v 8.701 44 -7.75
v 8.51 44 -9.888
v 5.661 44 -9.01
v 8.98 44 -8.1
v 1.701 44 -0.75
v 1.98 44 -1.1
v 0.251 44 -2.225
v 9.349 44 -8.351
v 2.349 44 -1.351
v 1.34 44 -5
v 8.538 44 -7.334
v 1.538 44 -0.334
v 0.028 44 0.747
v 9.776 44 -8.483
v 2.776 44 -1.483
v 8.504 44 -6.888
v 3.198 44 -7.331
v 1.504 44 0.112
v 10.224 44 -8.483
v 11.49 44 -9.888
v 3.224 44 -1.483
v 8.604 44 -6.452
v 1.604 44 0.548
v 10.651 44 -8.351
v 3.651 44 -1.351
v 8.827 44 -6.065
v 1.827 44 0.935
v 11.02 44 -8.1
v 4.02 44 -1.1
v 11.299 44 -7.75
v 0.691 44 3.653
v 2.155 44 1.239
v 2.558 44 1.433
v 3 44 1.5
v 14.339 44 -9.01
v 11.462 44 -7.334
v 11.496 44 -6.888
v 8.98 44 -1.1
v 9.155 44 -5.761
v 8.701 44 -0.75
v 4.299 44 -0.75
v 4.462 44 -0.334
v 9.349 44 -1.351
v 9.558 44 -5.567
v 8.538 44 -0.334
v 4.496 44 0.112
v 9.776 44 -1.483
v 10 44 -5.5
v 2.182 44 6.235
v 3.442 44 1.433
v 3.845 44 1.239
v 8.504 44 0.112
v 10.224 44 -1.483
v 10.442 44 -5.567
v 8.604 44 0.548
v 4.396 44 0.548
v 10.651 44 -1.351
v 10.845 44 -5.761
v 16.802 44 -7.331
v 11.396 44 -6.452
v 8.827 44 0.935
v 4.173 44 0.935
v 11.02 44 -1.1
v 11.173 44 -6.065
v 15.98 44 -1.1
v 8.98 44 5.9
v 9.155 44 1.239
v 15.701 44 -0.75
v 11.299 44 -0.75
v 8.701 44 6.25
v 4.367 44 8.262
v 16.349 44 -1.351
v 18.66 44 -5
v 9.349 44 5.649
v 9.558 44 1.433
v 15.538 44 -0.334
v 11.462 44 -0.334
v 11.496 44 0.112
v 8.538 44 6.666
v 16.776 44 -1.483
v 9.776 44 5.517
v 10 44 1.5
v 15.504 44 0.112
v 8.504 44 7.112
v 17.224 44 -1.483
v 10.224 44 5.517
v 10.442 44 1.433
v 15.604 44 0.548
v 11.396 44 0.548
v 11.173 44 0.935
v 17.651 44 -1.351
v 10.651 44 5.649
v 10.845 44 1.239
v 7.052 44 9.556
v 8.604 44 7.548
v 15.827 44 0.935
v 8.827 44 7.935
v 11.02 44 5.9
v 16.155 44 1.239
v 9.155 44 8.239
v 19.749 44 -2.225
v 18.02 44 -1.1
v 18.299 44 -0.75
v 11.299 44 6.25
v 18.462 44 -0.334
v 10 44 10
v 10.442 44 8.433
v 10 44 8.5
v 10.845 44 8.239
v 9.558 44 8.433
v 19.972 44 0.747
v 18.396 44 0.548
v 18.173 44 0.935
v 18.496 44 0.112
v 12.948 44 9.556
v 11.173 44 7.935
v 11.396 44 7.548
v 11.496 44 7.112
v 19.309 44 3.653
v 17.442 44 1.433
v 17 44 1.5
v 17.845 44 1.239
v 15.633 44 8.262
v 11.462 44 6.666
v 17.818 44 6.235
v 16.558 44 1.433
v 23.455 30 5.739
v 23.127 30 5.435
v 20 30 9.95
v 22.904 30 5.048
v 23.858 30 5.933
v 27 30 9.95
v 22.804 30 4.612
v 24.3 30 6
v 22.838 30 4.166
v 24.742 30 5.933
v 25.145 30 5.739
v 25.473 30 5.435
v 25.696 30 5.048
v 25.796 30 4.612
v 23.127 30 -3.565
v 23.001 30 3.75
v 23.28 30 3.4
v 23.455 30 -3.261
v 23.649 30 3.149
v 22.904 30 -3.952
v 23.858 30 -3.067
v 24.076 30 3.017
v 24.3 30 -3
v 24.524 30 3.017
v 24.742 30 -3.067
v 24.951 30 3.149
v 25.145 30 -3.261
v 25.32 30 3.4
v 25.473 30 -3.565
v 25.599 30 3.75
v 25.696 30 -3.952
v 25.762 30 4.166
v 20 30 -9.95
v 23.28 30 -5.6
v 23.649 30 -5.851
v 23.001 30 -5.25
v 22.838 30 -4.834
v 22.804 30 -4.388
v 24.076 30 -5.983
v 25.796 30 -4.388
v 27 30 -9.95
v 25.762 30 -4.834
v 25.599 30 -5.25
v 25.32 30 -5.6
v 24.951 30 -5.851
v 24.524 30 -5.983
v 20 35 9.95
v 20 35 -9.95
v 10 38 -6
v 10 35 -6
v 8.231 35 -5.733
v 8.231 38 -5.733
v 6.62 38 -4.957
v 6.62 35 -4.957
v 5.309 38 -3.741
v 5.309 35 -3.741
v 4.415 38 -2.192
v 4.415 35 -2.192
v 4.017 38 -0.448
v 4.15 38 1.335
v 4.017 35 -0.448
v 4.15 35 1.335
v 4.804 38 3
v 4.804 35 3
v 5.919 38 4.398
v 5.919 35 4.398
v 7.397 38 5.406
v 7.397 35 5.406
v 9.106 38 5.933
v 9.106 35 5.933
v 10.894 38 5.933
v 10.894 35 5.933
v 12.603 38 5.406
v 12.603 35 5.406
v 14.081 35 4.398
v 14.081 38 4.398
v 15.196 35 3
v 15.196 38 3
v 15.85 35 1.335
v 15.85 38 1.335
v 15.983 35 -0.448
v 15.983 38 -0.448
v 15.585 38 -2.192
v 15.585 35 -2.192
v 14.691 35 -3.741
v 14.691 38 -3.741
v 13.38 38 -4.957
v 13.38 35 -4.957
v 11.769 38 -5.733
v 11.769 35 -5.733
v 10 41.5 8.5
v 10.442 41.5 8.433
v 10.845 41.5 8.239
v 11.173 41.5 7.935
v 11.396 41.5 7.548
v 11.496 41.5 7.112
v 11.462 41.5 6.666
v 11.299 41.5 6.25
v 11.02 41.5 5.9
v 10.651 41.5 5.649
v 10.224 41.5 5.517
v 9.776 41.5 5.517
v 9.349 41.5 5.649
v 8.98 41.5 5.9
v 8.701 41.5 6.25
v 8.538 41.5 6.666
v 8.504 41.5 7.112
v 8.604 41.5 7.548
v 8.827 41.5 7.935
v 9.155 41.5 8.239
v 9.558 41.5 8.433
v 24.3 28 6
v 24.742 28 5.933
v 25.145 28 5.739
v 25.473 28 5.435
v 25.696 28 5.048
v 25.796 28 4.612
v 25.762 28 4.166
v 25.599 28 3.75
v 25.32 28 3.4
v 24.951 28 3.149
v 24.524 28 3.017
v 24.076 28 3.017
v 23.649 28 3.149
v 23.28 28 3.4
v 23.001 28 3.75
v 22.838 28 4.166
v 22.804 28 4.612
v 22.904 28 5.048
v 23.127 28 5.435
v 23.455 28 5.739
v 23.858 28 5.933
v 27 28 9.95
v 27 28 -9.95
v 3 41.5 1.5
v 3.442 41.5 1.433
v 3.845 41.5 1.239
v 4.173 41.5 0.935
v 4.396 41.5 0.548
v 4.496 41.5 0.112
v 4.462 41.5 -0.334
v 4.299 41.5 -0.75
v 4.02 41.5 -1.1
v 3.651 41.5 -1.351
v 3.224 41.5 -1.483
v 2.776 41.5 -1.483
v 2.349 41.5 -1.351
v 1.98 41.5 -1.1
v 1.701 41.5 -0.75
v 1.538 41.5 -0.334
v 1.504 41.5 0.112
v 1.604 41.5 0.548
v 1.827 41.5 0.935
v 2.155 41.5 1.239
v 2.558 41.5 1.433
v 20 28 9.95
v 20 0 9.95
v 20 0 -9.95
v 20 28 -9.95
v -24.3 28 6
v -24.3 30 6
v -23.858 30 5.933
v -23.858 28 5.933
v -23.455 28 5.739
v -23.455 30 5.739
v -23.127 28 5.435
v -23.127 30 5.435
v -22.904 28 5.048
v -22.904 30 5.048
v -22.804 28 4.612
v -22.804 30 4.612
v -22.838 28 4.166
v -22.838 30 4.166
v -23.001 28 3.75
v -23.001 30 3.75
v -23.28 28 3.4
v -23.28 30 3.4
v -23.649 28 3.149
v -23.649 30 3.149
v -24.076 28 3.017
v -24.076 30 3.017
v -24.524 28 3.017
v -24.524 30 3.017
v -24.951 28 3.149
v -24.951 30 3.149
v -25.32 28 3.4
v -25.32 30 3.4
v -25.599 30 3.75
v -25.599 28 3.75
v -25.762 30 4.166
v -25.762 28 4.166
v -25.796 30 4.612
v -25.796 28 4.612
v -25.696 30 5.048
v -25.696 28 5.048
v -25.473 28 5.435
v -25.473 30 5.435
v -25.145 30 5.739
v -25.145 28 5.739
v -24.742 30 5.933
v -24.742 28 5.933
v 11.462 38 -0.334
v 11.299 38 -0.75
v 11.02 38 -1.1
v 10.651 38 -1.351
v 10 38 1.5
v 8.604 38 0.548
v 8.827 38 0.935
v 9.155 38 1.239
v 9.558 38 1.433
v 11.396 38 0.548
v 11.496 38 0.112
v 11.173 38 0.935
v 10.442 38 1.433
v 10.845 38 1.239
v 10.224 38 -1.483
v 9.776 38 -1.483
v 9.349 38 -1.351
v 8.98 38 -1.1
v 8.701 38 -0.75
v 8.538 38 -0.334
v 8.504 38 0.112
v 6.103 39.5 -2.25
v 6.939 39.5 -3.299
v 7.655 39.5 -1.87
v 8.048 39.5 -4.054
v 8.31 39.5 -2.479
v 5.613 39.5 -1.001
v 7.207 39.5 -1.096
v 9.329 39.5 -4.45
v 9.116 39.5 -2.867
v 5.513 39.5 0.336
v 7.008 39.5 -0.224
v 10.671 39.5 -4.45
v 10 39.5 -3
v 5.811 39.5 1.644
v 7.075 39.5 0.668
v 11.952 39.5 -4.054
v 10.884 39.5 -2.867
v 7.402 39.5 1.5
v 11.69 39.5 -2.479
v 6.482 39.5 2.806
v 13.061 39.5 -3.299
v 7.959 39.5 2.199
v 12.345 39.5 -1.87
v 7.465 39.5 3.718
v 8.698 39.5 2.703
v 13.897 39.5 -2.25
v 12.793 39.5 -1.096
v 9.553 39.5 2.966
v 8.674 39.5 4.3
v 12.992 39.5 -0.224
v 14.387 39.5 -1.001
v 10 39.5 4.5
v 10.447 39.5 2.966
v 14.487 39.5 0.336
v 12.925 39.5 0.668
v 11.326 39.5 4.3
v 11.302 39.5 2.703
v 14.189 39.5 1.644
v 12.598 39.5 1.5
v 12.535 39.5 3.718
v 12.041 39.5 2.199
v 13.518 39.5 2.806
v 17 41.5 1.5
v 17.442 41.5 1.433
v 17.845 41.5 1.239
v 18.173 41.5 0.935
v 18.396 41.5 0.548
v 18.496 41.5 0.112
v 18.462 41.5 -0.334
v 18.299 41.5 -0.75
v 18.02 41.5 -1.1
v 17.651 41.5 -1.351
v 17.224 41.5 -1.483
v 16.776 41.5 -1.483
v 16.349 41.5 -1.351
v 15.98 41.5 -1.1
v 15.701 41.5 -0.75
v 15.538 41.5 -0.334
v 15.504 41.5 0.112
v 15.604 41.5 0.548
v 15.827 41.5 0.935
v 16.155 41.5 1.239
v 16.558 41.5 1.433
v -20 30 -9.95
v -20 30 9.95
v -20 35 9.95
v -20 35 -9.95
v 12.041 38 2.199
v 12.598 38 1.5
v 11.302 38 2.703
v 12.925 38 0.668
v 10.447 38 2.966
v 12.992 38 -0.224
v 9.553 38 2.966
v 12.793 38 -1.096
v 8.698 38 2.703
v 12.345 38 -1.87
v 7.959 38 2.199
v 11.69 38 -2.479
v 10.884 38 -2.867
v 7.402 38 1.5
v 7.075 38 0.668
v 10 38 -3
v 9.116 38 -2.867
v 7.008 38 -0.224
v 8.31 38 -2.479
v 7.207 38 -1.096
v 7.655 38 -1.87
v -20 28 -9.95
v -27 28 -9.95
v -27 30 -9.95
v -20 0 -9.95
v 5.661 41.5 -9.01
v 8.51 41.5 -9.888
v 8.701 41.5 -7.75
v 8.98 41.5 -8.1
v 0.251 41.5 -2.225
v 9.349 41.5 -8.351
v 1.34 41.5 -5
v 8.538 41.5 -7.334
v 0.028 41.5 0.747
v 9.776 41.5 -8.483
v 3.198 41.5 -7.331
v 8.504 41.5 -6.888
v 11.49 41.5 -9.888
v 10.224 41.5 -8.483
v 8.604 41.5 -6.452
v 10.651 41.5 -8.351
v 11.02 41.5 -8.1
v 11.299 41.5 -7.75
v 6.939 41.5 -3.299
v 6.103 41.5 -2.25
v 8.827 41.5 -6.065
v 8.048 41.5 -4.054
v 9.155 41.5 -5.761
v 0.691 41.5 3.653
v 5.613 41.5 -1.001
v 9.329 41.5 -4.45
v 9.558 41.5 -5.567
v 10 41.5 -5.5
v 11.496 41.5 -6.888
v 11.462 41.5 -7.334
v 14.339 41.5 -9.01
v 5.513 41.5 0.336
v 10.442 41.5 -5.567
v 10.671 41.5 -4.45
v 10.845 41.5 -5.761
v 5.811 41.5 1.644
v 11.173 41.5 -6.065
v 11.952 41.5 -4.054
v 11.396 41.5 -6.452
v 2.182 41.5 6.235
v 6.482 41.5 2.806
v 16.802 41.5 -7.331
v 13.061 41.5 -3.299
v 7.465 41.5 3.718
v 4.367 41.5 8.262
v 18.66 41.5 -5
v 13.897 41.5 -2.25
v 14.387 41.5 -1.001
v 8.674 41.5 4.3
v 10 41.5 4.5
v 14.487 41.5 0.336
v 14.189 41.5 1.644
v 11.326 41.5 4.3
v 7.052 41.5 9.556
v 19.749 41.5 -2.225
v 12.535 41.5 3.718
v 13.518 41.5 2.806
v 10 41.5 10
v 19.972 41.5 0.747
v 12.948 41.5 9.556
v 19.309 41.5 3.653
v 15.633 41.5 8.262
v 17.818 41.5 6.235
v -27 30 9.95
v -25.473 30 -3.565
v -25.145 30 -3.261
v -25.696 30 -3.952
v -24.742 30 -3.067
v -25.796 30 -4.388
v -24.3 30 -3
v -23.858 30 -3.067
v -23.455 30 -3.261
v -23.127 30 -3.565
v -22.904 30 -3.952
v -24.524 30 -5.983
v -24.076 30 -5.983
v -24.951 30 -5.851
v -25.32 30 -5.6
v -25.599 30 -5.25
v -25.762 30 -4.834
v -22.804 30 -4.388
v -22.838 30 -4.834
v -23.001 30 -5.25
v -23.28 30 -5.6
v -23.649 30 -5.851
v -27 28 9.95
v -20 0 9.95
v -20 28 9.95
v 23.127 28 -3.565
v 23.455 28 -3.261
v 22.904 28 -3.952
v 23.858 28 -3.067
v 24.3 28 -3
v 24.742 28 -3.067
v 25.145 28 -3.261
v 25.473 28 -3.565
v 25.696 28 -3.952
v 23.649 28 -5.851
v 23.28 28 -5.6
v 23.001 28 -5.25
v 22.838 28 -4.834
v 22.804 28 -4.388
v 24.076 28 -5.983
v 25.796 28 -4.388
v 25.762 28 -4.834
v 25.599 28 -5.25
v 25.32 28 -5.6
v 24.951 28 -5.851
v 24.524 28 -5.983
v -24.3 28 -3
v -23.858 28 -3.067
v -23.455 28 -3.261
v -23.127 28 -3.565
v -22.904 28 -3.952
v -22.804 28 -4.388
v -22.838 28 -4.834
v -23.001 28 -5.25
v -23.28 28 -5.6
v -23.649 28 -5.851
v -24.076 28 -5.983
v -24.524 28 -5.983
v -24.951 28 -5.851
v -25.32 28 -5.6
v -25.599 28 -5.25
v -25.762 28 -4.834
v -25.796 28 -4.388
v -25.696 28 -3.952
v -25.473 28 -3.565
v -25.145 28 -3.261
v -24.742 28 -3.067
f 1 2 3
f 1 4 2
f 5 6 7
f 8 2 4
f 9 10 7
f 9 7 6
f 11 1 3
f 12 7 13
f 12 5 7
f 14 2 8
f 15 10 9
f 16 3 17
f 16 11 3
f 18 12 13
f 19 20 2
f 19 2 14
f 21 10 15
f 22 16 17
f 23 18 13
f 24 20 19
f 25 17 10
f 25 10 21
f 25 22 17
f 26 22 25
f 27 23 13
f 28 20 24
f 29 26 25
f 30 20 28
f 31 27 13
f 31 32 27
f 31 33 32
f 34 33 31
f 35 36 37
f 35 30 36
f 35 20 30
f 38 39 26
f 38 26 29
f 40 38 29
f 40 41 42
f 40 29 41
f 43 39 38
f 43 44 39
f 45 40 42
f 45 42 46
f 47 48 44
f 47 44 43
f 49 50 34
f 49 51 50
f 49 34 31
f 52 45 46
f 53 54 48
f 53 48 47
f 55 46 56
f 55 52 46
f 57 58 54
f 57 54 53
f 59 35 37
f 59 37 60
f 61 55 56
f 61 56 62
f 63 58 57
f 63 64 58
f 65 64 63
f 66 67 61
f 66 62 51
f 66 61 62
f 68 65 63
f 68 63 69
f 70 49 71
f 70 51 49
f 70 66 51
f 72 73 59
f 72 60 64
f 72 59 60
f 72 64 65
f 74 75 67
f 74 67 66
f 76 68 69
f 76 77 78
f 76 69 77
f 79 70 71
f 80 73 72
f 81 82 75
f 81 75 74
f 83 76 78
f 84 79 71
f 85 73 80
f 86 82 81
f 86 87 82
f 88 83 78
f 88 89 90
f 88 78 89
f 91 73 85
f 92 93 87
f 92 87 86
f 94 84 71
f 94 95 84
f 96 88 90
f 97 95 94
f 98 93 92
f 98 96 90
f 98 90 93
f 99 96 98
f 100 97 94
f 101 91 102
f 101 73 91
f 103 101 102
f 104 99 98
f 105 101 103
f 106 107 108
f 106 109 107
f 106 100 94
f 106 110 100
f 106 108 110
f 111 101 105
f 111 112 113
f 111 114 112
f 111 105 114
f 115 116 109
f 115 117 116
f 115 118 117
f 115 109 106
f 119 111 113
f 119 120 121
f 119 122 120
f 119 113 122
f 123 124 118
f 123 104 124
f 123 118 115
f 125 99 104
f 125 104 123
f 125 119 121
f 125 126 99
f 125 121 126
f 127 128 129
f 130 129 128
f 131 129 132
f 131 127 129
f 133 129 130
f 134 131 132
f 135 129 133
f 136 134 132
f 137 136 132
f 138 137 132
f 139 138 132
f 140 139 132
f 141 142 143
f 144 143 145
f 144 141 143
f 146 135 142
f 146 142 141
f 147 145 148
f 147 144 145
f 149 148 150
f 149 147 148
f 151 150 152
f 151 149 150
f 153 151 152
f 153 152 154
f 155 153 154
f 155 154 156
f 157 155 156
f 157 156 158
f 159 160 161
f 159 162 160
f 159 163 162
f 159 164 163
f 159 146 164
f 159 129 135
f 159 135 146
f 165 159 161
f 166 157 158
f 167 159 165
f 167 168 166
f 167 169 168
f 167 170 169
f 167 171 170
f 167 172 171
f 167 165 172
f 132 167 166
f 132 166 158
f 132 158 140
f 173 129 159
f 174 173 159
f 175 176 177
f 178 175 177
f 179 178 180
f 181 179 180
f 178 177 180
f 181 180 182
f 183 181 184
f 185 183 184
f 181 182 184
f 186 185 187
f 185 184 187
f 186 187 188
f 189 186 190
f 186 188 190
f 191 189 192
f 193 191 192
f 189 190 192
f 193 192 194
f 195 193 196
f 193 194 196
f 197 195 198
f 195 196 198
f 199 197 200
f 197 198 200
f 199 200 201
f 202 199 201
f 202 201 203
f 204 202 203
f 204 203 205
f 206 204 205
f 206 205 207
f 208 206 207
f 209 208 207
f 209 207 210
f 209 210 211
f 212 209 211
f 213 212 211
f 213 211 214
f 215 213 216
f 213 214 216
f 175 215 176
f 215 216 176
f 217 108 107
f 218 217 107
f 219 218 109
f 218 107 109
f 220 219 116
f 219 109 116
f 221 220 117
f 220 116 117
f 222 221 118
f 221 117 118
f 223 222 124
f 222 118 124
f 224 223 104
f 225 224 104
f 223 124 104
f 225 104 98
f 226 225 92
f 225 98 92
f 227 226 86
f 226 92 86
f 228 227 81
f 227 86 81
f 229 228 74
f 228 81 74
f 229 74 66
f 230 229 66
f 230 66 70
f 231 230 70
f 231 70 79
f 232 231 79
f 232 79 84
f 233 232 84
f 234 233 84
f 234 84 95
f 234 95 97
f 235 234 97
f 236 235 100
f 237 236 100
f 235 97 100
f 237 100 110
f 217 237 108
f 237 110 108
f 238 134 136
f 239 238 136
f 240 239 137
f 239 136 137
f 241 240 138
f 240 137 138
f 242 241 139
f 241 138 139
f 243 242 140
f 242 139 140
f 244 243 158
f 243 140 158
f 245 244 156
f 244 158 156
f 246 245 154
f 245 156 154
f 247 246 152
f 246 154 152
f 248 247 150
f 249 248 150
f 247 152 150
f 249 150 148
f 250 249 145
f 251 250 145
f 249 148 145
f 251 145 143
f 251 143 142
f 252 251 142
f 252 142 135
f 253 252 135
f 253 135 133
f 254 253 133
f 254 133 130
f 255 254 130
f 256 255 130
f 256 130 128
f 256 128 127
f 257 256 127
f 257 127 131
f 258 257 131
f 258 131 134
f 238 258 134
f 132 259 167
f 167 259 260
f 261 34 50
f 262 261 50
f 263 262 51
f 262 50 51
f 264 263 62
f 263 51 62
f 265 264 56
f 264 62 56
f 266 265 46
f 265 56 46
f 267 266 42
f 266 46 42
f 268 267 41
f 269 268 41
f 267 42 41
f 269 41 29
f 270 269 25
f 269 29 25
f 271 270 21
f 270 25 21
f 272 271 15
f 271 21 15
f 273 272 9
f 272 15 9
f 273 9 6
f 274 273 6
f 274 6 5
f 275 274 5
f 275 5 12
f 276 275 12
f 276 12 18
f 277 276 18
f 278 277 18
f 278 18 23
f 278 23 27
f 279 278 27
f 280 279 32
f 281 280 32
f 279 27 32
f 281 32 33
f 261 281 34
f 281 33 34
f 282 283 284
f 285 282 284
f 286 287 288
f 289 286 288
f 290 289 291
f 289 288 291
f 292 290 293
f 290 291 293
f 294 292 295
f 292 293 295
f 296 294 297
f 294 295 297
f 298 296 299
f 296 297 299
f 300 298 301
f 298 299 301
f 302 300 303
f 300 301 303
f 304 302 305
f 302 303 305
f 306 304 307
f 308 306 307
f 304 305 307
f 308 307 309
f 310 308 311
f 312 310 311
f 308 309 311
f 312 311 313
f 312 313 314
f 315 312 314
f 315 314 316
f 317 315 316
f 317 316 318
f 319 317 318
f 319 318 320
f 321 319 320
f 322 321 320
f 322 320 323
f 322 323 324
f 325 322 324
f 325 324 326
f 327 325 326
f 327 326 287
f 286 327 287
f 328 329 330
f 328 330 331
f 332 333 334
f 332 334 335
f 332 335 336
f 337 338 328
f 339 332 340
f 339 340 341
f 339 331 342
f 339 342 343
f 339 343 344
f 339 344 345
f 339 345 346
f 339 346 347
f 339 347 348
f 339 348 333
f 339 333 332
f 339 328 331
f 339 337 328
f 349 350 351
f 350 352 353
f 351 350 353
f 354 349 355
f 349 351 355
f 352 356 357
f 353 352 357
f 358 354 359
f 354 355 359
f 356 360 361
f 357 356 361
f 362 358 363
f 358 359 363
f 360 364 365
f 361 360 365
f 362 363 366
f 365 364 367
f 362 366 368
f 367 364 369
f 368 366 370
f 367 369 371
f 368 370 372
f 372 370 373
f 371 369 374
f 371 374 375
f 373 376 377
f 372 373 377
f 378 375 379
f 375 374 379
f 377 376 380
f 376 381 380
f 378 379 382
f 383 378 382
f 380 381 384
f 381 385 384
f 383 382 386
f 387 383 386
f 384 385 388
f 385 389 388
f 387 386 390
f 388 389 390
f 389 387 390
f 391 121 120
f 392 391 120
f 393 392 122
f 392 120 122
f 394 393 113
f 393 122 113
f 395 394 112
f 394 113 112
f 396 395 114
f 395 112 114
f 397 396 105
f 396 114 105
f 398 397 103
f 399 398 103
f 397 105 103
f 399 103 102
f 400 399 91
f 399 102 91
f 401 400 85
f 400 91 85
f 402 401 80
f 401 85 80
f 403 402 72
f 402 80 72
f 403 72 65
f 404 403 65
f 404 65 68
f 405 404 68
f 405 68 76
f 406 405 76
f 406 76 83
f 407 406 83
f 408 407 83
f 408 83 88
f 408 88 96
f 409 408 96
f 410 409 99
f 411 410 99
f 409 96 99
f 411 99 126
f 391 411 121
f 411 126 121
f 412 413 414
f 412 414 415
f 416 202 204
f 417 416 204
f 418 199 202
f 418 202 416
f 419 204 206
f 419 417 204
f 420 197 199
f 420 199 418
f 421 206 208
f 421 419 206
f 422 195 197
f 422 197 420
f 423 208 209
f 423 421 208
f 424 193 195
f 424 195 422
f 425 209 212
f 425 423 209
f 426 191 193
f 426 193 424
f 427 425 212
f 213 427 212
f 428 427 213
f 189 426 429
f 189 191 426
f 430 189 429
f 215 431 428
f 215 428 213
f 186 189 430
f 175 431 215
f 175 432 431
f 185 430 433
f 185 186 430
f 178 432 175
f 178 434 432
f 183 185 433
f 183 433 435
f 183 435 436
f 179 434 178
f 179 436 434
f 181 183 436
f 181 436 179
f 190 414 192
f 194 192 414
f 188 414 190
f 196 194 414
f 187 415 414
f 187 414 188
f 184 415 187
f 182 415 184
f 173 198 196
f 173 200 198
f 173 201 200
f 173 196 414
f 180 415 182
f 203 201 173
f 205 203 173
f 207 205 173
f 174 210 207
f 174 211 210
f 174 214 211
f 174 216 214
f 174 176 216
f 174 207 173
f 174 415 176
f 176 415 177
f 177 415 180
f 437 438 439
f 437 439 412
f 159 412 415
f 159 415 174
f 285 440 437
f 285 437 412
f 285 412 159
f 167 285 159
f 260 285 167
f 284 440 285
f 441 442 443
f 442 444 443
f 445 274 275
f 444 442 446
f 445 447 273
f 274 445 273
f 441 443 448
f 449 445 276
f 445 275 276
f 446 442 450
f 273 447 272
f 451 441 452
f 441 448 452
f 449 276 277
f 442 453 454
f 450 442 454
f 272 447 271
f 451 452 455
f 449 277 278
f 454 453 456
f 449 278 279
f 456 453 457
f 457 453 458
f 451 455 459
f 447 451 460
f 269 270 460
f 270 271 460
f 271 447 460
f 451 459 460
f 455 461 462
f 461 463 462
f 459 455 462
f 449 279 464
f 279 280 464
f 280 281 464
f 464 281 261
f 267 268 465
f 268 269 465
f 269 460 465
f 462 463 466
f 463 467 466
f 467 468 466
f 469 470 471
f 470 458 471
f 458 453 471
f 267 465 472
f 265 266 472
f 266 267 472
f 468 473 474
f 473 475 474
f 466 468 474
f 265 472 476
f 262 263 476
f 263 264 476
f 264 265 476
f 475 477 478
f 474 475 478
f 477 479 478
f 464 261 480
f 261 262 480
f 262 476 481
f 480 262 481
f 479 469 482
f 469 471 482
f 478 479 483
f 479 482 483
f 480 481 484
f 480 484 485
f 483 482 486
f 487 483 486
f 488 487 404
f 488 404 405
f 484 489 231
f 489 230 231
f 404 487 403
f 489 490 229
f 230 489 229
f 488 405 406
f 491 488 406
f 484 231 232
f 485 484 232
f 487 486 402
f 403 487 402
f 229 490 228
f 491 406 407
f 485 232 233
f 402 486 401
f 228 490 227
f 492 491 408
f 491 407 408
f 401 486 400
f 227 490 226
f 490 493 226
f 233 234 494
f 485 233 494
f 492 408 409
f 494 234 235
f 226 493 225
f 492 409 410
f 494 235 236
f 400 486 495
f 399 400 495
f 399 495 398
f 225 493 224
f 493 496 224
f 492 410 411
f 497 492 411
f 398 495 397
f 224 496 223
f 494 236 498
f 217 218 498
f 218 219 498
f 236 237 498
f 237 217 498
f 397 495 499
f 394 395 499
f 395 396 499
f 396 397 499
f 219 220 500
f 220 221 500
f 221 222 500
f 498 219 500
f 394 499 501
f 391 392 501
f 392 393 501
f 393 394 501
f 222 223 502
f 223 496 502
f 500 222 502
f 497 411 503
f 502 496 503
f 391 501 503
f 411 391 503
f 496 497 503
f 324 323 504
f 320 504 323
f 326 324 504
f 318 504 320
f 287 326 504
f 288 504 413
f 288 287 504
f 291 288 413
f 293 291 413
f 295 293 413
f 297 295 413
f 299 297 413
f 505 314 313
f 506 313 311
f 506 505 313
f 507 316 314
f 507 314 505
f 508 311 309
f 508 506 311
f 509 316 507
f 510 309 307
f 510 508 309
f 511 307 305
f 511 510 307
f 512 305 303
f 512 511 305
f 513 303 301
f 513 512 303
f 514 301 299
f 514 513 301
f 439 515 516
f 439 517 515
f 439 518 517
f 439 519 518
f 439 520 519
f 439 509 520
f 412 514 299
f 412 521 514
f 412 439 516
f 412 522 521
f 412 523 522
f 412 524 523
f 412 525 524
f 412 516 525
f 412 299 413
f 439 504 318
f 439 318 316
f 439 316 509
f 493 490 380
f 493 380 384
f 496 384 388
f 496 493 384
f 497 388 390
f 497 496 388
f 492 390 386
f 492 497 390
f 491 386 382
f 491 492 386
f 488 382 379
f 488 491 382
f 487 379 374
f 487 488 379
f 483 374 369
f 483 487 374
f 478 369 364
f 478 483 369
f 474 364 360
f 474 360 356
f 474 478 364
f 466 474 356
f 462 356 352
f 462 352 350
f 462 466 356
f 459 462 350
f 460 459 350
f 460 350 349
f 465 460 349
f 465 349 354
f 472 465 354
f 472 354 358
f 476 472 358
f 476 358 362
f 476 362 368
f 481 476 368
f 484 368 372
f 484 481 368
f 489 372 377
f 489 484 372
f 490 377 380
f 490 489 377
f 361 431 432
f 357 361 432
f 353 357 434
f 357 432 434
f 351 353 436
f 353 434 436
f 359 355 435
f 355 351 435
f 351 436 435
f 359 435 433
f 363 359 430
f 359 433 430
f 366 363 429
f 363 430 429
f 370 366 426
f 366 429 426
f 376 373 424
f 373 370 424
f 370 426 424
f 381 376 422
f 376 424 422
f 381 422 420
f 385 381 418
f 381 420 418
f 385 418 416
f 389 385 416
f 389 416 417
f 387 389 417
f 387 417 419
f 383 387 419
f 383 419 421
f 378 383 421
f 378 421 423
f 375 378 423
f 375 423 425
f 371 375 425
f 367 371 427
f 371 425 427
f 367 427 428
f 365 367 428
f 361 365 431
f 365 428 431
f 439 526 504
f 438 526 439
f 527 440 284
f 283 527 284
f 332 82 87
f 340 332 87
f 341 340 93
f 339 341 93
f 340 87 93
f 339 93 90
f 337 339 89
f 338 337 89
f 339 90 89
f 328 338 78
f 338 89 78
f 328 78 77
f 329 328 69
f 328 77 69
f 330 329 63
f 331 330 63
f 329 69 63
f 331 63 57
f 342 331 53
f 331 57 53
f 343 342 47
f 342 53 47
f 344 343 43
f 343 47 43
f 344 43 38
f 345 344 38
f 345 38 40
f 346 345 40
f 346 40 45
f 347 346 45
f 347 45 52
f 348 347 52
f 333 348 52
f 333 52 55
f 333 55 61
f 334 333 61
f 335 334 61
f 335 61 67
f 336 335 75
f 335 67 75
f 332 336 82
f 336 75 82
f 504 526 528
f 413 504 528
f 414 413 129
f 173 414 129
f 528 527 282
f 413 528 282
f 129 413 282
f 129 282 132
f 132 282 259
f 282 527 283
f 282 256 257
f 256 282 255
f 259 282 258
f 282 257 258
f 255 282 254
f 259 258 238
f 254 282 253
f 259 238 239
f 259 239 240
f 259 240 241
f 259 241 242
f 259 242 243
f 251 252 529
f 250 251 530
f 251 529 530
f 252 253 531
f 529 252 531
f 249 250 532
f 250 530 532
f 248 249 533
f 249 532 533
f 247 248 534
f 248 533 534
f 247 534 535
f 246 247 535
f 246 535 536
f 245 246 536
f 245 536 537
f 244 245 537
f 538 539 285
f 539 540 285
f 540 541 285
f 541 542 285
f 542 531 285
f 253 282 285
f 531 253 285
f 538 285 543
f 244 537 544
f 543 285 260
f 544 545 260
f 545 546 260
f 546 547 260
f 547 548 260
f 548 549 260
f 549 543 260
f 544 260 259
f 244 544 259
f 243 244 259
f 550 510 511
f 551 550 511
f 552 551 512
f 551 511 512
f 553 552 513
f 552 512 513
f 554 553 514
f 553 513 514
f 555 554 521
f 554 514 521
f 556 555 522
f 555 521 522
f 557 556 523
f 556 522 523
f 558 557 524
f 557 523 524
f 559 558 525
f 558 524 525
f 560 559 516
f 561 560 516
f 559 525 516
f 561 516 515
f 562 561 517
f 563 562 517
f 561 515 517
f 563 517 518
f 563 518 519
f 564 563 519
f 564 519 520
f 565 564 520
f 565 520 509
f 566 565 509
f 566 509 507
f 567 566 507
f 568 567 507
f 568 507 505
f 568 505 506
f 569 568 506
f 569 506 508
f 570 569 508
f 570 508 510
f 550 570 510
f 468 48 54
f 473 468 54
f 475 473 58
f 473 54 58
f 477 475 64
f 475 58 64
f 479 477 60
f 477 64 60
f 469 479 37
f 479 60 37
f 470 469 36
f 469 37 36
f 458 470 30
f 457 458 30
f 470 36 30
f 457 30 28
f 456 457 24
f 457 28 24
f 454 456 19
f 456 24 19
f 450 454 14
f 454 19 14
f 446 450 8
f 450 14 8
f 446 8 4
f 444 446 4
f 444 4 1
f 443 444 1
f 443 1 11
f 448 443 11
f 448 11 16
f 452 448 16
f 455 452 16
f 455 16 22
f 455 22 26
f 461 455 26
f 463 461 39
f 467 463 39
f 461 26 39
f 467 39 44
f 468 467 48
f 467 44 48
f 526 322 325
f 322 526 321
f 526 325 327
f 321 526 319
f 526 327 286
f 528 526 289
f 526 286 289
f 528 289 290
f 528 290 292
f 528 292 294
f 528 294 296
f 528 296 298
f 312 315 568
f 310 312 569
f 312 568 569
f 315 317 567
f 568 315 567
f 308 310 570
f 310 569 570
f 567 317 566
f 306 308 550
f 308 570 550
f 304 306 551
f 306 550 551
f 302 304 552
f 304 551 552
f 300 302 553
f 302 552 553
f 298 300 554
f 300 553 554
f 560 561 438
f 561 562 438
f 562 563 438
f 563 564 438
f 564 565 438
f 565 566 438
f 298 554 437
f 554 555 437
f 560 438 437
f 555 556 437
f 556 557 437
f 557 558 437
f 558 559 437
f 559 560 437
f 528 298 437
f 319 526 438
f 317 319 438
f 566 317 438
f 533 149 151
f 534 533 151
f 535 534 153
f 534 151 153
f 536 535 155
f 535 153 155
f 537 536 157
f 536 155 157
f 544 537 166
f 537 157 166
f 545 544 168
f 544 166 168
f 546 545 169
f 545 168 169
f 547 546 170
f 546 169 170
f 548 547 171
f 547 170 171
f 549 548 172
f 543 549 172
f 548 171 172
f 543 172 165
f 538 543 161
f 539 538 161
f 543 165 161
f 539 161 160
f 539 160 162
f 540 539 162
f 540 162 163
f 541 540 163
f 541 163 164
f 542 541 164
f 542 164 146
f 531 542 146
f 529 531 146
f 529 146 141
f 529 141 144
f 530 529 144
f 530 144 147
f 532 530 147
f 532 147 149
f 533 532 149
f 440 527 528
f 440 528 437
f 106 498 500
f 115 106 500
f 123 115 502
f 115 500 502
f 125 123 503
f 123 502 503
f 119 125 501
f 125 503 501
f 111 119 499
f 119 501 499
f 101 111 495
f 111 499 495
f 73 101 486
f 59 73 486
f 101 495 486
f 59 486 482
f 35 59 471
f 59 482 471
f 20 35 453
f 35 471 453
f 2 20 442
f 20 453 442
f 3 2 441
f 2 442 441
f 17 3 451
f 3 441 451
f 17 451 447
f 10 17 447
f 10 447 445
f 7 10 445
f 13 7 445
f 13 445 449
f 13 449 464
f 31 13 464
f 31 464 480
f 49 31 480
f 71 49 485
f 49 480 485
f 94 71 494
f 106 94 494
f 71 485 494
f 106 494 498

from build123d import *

# Parameters (mm, degrees)
SKETCH_1_W          = 40
SKETCH_1_H          = 19.9
EXTRUDE_1_DEPTH     = 28
SKETCH_2_W          = 54
SKETCH_2_H          = 19.9
EXTRUDE_2_DEPTH     = 2
SKETCH_3_W          = 40
SKETCH_3_H          = 19.9
EXTRUDE_3_DEPTH     = 5
SKETCH_4_R          = 1.5
CUT_EXTRUDE_1_DEPTH = 42.569249452
SKETCH_5_R          = 3
EXTRUDE_4_DEPTH     = 6.5
SKETCH_7_R          = 6
EXTRUDE_5_DEPTH     = 3
SKETCH_8_R          = 4.5
EXTRUDE_6_DEPTH     = 2
SKETCH_9_R          = 10
EXTRUDE_7_DEPTH     = 2.5
SKETCH_10_R         = 1.5
CUT_EXTRUDE_2_DEPTH = 2.5
SKETCH_11_R         = 1.5
CUT_EXTRUDE_3_DEPTH = 6


with BuildPart() as part:
    # 草图1 → 凸台-拉伸1 (new body)
    with BuildSketch(Plane(origin=(0, 0, 0), x_dir=(1, 0, 0), z_dir=(0, 1, 0))):
        Rectangle(SKETCH_1_W, SKETCH_1_H)
    extrude(amount=EXTRUDE_1_DEPTH)

    # 草图2 → 凸台-拉伸2 (add)
    with BuildSketch(Plane(origin=(0, 28, 0), x_dir=(1, 0, 0), z_dir=(0, 1, 0))):
        Rectangle(SKETCH_2_W, SKETCH_2_H)
    extrude(amount=EXTRUDE_2_DEPTH)

    # 草图3 → 凸台-拉伸3 (add)
    with BuildSketch(Plane(origin=(0, 30, 0), x_dir=(1, 0, 0), z_dir=(0, 1, 0))):
        Rectangle(SKETCH_3_W, SKETCH_3_H)
    extrude(amount=EXTRUDE_3_DEPTH)

    # 草图4 → 切除-拉伸1 (cut, through all)
    with BuildSketch(Plane(origin=(0, 30, 0), x_dir=(1, 0, 0), z_dir=(0, 1, 0))):
        with Locations(Location((-24.3, 4.5, 0), (0, 0, 270))):
            Circle(SKETCH_4_R)
        with Locations(Location((24.3, 4.5, 0), (0, 0, 270))):
            Circle(SKETCH_4_R)
        with Locations(Location((24.3, -4.5, 0), (0, 0, 270))):
            Circle(SKETCH_4_R)
        with Locations(Location((-24.3, -4.5, 0), (0, 0, 270))):
            Circle(SKETCH_4_R)
    extrude(amount=-CUT_EXTRUDE_1_DEPTH, mode=Mode.SUBTRACT)

    # 草图5 → 凸台-拉伸4 (add)
    with BuildSketch(Plane(origin=(0, 35, 0), x_dir=(1, 0, 0), z_dir=(0, 1, 0))):
        with Locations(Location((10, 0, 0), (0, 0, 90))):
            Circle(SKETCH_5_R)
    extrude(amount=EXTRUDE_4_DEPTH)

    # 草图7 → 凸台-拉伸5 (add)
    with BuildSketch(Plane(origin=(0, 35, 0), x_dir=(1, 0, 0), z_dir=(0, 1, 0))):
        with Locations(Location((10, 0, 0), (0, 0, 90))):
            Circle(SKETCH_7_R)
    extrude(amount=EXTRUDE_5_DEPTH)

    # 草图8 → 凸台-拉伸6 (add)
    with BuildSketch(Plane(origin=(0, 41.5, 0), x_dir=(1, 0, 0), z_dir=(0, 1, 0))):
        with Locations(Location((10, 0, 0), (0, 0, 270))):
            Circle(SKETCH_8_R)
    extrude(amount=-EXTRUDE_6_DEPTH)

    # 草图9 → 凸台-拉伸7 (add)
    with BuildSketch(Plane(origin=(0, 41.5, 0), x_dir=(1, 0, 0), z_dir=(0, 1, 0))):
        with Locations(Location((10, 0, 0), (0, 0, 270))):
            Circle(SKETCH_9_R)
    extrude(amount=EXTRUDE_7_DEPTH)

    # 草图10 → 切除-拉伸2 (cut)
    with BuildSketch(Plane(origin=(0, 44, 0), x_dir=(1, 0, 0), z_dir=(0, 1, 0))):
        with Locations(Location((10, 7, 0), (0, 0, 270))):
            Circle(SKETCH_10_R)
        with Locations(Location((17, 0, 0), (0, 0, 270))):
            Circle(SKETCH_10_R)
        with Locations(Location((10, -7, 0), (0, 0, 270))):
            Circle(SKETCH_10_R)
        with Locations(Location((3, 0, 0), (0, 0, 270))):
            Circle(SKETCH_10_R)
    extrude(amount=-CUT_EXTRUDE_2_DEPTH, mode=Mode.SUBTRACT)

    # 草图11 → 切除-拉伸3 (cut)
    with BuildSketch(Plane(origin=(0, 44, 0), x_dir=(1, 0, 0), z_dir=(0, 1, 0))):
        with Locations(Location((10, 0, 0), (0, 0, 270))):
            Circle(SKETCH_11_R)
    extrude(amount=-CUT_EXTRUDE_3_DEPTH, mode=Mode.SUBTRACT)


solid = part.part
